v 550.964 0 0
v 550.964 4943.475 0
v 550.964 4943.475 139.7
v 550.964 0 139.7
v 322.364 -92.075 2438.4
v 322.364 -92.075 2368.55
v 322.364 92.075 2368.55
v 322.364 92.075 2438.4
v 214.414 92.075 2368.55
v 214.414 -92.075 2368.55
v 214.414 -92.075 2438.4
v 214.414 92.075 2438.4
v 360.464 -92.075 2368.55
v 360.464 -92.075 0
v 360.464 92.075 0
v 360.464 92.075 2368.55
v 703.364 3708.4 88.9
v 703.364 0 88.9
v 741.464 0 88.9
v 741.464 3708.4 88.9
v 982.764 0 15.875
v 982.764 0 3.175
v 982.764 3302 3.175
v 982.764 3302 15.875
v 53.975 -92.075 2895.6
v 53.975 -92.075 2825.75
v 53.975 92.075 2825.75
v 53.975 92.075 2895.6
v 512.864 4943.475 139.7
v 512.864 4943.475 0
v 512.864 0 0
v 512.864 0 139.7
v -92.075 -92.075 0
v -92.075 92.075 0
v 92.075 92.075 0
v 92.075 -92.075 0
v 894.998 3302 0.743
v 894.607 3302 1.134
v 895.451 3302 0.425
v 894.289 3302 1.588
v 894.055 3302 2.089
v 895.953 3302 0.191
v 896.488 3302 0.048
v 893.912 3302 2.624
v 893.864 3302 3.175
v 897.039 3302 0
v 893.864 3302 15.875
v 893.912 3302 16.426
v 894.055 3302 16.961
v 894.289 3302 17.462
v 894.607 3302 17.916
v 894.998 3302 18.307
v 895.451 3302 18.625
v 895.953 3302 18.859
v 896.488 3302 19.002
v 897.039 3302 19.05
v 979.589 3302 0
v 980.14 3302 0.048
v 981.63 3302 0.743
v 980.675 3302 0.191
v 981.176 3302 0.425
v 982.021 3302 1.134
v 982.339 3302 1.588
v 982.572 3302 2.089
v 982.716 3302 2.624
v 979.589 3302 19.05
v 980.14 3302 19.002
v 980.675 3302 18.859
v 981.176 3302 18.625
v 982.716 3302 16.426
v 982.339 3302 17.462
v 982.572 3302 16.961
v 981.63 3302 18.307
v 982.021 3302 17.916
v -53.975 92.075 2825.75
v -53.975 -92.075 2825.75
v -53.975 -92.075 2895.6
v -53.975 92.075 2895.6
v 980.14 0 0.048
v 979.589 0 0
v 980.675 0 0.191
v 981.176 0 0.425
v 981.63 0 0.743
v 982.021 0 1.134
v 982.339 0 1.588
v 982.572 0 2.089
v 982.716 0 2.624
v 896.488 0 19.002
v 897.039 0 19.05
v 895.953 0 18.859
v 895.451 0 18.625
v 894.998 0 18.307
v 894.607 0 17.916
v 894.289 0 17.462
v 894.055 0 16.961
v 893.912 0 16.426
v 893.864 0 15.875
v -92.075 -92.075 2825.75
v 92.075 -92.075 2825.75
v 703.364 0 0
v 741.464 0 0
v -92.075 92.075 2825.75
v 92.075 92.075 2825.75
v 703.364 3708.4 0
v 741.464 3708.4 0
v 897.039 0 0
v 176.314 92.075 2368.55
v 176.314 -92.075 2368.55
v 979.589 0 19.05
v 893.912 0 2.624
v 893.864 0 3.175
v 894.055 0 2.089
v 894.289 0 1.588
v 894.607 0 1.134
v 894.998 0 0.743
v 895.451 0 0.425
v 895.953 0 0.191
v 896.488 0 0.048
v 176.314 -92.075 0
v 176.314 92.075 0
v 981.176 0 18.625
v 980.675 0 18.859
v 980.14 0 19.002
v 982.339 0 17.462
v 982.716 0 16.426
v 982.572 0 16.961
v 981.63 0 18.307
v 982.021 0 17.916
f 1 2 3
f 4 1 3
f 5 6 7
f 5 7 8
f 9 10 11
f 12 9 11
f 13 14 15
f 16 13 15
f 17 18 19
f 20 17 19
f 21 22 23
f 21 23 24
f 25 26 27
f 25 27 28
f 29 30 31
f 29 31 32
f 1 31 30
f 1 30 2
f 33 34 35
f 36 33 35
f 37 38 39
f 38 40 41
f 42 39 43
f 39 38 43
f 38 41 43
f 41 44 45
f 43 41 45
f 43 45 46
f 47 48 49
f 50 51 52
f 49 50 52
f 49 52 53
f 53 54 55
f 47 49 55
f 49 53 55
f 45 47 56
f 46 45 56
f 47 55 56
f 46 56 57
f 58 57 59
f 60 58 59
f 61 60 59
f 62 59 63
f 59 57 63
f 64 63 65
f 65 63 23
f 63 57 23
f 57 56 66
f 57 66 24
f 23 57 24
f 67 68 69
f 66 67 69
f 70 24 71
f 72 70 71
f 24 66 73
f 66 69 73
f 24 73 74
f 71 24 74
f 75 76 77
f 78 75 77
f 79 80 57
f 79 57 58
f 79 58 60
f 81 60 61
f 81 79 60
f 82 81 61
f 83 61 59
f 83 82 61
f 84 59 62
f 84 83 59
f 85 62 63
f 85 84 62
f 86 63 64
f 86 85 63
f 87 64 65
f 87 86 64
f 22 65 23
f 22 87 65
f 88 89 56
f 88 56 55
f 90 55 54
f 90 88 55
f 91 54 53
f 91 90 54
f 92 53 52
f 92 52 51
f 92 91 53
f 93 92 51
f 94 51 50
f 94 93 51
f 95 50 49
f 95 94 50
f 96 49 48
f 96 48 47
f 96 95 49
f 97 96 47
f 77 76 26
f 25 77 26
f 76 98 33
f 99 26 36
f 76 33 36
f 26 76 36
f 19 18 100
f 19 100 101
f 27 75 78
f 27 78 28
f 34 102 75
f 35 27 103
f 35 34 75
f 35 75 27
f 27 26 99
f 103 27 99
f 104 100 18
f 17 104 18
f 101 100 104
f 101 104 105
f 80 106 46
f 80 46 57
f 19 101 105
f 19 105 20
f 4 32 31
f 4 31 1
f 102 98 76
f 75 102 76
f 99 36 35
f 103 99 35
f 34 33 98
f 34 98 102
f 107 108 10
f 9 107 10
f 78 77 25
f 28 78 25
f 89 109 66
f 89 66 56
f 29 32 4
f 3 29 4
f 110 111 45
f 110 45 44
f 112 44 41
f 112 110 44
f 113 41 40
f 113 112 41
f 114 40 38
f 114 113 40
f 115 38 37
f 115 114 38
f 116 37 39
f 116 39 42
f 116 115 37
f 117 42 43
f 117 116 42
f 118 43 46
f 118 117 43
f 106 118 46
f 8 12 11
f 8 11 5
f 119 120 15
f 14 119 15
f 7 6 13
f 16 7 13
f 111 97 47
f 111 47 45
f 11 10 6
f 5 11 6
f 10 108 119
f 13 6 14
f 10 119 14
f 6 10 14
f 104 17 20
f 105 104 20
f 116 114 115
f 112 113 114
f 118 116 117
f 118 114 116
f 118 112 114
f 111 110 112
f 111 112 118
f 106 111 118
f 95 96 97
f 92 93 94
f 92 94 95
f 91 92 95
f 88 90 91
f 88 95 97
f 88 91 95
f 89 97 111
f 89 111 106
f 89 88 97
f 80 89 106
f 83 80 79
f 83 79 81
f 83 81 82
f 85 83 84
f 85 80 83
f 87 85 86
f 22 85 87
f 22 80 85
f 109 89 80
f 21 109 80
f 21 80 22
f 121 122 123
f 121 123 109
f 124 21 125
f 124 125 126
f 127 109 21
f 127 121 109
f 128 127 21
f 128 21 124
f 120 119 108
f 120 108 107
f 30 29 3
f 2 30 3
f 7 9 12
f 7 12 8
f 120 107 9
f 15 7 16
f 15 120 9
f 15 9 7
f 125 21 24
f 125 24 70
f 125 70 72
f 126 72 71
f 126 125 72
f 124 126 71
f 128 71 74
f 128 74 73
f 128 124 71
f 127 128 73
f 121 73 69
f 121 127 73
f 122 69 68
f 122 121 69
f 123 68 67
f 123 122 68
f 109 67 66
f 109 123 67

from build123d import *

# Parameters (mm, degrees)
F0_W      = 184.15
F0_H      = 184.15
F1_DEPTH  = 2895.6
F2_DEPTH  = 2438.4
F3_W      = 38.1
F3_H      = 139.7
F4_DEPTH  = 4943.475
F5_W      = 38.1
F5_H      = 69.85
F6_DEPTH  = 184.15
F7_W      = 38.1
F7_H      = 69.85
F8_DEPTH  = 184.15
F9_W      = 38.1
F9_H      = 88.9
F10_DEPTH = 3708.4
F12_DEPTH = 3302


with BuildPart() as f1:
    # F0 (on Top) → F1 (new body)
    with BuildSketch(Plane.XY):
        Rectangle(F0_W, F0_H)
    extrude(amount=F1_DEPTH)

    # F7 (on face) → F8 (cut, through all)
    with BuildSketch(Plane.XZ.offset(92.075)):
        with Locations((-73.025, 2860.675)):
            Rectangle(F7_W, F7_H)
        with Locations((73.025, 2860.675)):
            Rectangle(F7_W, F7_H)
    extrude(amount=-F8_DEPTH, mode=Mode.SUBTRACT)


with BuildPart() as f2:
    # F0 (on Top) → F2 (new body)
    with BuildSketch(Plane.XY):
        with Locations((268.388892, 0)):
            Rectangle(F0_W, F0_H)
    extrude(amount=F2_DEPTH)

    # F5 (on face) → F6 (cut, through all)
    with BuildSketch(Plane.XZ.offset(92.075)):
        with Locations((341.413892, 2403.475)):
            Rectangle(F5_W, F5_H)
        with Locations((195.363892, 2403.475)):
            Rectangle(F5_W, F5_H)
    extrude(amount=-F6_DEPTH, mode=Mode.SUBTRACT)


with BuildPart() as f4:
    # F3 (on Front) → F4 (new body)
    with BuildSketch(Plane.XZ):
        with Locations((531.913892, 69.85)):
            Rectangle(F3_W, F3_H)
    extrude(amount=-F4_DEPTH)


with BuildPart() as f10:
    # F9 (on Front) → F10 (new body)
    with BuildSketch(Plane.XZ):
        with Locations((722.413892, 44.45)):
            Rectangle(F9_W, F9_H)
    extrude(amount=-F10_DEPTH)


with BuildPart() as f12:
    # F11 (on Front) → F12 (new body)
    with BuildSketch(Plane.XZ):
        with BuildLine():
            ThreePointArc((893.863892, 3.175), (894.793828, 0.929936), (897.038892, 0))
            Line((897.038892, 0), (979.588892, 0))
            ThreePointArc((979.588892, 0), (981.833956, 0.929936), (982.763892, 3.175))
            Line((982.763892, 3.175), (982.763892, 15.875))
            ThreePointArc((982.763892, 15.875), (981.833956, 18.120064), (979.588892, 19.05))
            Line((979.588892, 19.05), (897.038892, 19.05))
            ThreePointArc((897.038892, 19.05), (894.793828, 18.120064), (893.863892, 15.875))
            Line((893.863892, 15.875), (893.863892, 3.175))
        make_face()
    extrude(amount=-F12_DEPTH)


solid = Compound([f1.part, f2.part, f4.part, f10.part, f12.part])
